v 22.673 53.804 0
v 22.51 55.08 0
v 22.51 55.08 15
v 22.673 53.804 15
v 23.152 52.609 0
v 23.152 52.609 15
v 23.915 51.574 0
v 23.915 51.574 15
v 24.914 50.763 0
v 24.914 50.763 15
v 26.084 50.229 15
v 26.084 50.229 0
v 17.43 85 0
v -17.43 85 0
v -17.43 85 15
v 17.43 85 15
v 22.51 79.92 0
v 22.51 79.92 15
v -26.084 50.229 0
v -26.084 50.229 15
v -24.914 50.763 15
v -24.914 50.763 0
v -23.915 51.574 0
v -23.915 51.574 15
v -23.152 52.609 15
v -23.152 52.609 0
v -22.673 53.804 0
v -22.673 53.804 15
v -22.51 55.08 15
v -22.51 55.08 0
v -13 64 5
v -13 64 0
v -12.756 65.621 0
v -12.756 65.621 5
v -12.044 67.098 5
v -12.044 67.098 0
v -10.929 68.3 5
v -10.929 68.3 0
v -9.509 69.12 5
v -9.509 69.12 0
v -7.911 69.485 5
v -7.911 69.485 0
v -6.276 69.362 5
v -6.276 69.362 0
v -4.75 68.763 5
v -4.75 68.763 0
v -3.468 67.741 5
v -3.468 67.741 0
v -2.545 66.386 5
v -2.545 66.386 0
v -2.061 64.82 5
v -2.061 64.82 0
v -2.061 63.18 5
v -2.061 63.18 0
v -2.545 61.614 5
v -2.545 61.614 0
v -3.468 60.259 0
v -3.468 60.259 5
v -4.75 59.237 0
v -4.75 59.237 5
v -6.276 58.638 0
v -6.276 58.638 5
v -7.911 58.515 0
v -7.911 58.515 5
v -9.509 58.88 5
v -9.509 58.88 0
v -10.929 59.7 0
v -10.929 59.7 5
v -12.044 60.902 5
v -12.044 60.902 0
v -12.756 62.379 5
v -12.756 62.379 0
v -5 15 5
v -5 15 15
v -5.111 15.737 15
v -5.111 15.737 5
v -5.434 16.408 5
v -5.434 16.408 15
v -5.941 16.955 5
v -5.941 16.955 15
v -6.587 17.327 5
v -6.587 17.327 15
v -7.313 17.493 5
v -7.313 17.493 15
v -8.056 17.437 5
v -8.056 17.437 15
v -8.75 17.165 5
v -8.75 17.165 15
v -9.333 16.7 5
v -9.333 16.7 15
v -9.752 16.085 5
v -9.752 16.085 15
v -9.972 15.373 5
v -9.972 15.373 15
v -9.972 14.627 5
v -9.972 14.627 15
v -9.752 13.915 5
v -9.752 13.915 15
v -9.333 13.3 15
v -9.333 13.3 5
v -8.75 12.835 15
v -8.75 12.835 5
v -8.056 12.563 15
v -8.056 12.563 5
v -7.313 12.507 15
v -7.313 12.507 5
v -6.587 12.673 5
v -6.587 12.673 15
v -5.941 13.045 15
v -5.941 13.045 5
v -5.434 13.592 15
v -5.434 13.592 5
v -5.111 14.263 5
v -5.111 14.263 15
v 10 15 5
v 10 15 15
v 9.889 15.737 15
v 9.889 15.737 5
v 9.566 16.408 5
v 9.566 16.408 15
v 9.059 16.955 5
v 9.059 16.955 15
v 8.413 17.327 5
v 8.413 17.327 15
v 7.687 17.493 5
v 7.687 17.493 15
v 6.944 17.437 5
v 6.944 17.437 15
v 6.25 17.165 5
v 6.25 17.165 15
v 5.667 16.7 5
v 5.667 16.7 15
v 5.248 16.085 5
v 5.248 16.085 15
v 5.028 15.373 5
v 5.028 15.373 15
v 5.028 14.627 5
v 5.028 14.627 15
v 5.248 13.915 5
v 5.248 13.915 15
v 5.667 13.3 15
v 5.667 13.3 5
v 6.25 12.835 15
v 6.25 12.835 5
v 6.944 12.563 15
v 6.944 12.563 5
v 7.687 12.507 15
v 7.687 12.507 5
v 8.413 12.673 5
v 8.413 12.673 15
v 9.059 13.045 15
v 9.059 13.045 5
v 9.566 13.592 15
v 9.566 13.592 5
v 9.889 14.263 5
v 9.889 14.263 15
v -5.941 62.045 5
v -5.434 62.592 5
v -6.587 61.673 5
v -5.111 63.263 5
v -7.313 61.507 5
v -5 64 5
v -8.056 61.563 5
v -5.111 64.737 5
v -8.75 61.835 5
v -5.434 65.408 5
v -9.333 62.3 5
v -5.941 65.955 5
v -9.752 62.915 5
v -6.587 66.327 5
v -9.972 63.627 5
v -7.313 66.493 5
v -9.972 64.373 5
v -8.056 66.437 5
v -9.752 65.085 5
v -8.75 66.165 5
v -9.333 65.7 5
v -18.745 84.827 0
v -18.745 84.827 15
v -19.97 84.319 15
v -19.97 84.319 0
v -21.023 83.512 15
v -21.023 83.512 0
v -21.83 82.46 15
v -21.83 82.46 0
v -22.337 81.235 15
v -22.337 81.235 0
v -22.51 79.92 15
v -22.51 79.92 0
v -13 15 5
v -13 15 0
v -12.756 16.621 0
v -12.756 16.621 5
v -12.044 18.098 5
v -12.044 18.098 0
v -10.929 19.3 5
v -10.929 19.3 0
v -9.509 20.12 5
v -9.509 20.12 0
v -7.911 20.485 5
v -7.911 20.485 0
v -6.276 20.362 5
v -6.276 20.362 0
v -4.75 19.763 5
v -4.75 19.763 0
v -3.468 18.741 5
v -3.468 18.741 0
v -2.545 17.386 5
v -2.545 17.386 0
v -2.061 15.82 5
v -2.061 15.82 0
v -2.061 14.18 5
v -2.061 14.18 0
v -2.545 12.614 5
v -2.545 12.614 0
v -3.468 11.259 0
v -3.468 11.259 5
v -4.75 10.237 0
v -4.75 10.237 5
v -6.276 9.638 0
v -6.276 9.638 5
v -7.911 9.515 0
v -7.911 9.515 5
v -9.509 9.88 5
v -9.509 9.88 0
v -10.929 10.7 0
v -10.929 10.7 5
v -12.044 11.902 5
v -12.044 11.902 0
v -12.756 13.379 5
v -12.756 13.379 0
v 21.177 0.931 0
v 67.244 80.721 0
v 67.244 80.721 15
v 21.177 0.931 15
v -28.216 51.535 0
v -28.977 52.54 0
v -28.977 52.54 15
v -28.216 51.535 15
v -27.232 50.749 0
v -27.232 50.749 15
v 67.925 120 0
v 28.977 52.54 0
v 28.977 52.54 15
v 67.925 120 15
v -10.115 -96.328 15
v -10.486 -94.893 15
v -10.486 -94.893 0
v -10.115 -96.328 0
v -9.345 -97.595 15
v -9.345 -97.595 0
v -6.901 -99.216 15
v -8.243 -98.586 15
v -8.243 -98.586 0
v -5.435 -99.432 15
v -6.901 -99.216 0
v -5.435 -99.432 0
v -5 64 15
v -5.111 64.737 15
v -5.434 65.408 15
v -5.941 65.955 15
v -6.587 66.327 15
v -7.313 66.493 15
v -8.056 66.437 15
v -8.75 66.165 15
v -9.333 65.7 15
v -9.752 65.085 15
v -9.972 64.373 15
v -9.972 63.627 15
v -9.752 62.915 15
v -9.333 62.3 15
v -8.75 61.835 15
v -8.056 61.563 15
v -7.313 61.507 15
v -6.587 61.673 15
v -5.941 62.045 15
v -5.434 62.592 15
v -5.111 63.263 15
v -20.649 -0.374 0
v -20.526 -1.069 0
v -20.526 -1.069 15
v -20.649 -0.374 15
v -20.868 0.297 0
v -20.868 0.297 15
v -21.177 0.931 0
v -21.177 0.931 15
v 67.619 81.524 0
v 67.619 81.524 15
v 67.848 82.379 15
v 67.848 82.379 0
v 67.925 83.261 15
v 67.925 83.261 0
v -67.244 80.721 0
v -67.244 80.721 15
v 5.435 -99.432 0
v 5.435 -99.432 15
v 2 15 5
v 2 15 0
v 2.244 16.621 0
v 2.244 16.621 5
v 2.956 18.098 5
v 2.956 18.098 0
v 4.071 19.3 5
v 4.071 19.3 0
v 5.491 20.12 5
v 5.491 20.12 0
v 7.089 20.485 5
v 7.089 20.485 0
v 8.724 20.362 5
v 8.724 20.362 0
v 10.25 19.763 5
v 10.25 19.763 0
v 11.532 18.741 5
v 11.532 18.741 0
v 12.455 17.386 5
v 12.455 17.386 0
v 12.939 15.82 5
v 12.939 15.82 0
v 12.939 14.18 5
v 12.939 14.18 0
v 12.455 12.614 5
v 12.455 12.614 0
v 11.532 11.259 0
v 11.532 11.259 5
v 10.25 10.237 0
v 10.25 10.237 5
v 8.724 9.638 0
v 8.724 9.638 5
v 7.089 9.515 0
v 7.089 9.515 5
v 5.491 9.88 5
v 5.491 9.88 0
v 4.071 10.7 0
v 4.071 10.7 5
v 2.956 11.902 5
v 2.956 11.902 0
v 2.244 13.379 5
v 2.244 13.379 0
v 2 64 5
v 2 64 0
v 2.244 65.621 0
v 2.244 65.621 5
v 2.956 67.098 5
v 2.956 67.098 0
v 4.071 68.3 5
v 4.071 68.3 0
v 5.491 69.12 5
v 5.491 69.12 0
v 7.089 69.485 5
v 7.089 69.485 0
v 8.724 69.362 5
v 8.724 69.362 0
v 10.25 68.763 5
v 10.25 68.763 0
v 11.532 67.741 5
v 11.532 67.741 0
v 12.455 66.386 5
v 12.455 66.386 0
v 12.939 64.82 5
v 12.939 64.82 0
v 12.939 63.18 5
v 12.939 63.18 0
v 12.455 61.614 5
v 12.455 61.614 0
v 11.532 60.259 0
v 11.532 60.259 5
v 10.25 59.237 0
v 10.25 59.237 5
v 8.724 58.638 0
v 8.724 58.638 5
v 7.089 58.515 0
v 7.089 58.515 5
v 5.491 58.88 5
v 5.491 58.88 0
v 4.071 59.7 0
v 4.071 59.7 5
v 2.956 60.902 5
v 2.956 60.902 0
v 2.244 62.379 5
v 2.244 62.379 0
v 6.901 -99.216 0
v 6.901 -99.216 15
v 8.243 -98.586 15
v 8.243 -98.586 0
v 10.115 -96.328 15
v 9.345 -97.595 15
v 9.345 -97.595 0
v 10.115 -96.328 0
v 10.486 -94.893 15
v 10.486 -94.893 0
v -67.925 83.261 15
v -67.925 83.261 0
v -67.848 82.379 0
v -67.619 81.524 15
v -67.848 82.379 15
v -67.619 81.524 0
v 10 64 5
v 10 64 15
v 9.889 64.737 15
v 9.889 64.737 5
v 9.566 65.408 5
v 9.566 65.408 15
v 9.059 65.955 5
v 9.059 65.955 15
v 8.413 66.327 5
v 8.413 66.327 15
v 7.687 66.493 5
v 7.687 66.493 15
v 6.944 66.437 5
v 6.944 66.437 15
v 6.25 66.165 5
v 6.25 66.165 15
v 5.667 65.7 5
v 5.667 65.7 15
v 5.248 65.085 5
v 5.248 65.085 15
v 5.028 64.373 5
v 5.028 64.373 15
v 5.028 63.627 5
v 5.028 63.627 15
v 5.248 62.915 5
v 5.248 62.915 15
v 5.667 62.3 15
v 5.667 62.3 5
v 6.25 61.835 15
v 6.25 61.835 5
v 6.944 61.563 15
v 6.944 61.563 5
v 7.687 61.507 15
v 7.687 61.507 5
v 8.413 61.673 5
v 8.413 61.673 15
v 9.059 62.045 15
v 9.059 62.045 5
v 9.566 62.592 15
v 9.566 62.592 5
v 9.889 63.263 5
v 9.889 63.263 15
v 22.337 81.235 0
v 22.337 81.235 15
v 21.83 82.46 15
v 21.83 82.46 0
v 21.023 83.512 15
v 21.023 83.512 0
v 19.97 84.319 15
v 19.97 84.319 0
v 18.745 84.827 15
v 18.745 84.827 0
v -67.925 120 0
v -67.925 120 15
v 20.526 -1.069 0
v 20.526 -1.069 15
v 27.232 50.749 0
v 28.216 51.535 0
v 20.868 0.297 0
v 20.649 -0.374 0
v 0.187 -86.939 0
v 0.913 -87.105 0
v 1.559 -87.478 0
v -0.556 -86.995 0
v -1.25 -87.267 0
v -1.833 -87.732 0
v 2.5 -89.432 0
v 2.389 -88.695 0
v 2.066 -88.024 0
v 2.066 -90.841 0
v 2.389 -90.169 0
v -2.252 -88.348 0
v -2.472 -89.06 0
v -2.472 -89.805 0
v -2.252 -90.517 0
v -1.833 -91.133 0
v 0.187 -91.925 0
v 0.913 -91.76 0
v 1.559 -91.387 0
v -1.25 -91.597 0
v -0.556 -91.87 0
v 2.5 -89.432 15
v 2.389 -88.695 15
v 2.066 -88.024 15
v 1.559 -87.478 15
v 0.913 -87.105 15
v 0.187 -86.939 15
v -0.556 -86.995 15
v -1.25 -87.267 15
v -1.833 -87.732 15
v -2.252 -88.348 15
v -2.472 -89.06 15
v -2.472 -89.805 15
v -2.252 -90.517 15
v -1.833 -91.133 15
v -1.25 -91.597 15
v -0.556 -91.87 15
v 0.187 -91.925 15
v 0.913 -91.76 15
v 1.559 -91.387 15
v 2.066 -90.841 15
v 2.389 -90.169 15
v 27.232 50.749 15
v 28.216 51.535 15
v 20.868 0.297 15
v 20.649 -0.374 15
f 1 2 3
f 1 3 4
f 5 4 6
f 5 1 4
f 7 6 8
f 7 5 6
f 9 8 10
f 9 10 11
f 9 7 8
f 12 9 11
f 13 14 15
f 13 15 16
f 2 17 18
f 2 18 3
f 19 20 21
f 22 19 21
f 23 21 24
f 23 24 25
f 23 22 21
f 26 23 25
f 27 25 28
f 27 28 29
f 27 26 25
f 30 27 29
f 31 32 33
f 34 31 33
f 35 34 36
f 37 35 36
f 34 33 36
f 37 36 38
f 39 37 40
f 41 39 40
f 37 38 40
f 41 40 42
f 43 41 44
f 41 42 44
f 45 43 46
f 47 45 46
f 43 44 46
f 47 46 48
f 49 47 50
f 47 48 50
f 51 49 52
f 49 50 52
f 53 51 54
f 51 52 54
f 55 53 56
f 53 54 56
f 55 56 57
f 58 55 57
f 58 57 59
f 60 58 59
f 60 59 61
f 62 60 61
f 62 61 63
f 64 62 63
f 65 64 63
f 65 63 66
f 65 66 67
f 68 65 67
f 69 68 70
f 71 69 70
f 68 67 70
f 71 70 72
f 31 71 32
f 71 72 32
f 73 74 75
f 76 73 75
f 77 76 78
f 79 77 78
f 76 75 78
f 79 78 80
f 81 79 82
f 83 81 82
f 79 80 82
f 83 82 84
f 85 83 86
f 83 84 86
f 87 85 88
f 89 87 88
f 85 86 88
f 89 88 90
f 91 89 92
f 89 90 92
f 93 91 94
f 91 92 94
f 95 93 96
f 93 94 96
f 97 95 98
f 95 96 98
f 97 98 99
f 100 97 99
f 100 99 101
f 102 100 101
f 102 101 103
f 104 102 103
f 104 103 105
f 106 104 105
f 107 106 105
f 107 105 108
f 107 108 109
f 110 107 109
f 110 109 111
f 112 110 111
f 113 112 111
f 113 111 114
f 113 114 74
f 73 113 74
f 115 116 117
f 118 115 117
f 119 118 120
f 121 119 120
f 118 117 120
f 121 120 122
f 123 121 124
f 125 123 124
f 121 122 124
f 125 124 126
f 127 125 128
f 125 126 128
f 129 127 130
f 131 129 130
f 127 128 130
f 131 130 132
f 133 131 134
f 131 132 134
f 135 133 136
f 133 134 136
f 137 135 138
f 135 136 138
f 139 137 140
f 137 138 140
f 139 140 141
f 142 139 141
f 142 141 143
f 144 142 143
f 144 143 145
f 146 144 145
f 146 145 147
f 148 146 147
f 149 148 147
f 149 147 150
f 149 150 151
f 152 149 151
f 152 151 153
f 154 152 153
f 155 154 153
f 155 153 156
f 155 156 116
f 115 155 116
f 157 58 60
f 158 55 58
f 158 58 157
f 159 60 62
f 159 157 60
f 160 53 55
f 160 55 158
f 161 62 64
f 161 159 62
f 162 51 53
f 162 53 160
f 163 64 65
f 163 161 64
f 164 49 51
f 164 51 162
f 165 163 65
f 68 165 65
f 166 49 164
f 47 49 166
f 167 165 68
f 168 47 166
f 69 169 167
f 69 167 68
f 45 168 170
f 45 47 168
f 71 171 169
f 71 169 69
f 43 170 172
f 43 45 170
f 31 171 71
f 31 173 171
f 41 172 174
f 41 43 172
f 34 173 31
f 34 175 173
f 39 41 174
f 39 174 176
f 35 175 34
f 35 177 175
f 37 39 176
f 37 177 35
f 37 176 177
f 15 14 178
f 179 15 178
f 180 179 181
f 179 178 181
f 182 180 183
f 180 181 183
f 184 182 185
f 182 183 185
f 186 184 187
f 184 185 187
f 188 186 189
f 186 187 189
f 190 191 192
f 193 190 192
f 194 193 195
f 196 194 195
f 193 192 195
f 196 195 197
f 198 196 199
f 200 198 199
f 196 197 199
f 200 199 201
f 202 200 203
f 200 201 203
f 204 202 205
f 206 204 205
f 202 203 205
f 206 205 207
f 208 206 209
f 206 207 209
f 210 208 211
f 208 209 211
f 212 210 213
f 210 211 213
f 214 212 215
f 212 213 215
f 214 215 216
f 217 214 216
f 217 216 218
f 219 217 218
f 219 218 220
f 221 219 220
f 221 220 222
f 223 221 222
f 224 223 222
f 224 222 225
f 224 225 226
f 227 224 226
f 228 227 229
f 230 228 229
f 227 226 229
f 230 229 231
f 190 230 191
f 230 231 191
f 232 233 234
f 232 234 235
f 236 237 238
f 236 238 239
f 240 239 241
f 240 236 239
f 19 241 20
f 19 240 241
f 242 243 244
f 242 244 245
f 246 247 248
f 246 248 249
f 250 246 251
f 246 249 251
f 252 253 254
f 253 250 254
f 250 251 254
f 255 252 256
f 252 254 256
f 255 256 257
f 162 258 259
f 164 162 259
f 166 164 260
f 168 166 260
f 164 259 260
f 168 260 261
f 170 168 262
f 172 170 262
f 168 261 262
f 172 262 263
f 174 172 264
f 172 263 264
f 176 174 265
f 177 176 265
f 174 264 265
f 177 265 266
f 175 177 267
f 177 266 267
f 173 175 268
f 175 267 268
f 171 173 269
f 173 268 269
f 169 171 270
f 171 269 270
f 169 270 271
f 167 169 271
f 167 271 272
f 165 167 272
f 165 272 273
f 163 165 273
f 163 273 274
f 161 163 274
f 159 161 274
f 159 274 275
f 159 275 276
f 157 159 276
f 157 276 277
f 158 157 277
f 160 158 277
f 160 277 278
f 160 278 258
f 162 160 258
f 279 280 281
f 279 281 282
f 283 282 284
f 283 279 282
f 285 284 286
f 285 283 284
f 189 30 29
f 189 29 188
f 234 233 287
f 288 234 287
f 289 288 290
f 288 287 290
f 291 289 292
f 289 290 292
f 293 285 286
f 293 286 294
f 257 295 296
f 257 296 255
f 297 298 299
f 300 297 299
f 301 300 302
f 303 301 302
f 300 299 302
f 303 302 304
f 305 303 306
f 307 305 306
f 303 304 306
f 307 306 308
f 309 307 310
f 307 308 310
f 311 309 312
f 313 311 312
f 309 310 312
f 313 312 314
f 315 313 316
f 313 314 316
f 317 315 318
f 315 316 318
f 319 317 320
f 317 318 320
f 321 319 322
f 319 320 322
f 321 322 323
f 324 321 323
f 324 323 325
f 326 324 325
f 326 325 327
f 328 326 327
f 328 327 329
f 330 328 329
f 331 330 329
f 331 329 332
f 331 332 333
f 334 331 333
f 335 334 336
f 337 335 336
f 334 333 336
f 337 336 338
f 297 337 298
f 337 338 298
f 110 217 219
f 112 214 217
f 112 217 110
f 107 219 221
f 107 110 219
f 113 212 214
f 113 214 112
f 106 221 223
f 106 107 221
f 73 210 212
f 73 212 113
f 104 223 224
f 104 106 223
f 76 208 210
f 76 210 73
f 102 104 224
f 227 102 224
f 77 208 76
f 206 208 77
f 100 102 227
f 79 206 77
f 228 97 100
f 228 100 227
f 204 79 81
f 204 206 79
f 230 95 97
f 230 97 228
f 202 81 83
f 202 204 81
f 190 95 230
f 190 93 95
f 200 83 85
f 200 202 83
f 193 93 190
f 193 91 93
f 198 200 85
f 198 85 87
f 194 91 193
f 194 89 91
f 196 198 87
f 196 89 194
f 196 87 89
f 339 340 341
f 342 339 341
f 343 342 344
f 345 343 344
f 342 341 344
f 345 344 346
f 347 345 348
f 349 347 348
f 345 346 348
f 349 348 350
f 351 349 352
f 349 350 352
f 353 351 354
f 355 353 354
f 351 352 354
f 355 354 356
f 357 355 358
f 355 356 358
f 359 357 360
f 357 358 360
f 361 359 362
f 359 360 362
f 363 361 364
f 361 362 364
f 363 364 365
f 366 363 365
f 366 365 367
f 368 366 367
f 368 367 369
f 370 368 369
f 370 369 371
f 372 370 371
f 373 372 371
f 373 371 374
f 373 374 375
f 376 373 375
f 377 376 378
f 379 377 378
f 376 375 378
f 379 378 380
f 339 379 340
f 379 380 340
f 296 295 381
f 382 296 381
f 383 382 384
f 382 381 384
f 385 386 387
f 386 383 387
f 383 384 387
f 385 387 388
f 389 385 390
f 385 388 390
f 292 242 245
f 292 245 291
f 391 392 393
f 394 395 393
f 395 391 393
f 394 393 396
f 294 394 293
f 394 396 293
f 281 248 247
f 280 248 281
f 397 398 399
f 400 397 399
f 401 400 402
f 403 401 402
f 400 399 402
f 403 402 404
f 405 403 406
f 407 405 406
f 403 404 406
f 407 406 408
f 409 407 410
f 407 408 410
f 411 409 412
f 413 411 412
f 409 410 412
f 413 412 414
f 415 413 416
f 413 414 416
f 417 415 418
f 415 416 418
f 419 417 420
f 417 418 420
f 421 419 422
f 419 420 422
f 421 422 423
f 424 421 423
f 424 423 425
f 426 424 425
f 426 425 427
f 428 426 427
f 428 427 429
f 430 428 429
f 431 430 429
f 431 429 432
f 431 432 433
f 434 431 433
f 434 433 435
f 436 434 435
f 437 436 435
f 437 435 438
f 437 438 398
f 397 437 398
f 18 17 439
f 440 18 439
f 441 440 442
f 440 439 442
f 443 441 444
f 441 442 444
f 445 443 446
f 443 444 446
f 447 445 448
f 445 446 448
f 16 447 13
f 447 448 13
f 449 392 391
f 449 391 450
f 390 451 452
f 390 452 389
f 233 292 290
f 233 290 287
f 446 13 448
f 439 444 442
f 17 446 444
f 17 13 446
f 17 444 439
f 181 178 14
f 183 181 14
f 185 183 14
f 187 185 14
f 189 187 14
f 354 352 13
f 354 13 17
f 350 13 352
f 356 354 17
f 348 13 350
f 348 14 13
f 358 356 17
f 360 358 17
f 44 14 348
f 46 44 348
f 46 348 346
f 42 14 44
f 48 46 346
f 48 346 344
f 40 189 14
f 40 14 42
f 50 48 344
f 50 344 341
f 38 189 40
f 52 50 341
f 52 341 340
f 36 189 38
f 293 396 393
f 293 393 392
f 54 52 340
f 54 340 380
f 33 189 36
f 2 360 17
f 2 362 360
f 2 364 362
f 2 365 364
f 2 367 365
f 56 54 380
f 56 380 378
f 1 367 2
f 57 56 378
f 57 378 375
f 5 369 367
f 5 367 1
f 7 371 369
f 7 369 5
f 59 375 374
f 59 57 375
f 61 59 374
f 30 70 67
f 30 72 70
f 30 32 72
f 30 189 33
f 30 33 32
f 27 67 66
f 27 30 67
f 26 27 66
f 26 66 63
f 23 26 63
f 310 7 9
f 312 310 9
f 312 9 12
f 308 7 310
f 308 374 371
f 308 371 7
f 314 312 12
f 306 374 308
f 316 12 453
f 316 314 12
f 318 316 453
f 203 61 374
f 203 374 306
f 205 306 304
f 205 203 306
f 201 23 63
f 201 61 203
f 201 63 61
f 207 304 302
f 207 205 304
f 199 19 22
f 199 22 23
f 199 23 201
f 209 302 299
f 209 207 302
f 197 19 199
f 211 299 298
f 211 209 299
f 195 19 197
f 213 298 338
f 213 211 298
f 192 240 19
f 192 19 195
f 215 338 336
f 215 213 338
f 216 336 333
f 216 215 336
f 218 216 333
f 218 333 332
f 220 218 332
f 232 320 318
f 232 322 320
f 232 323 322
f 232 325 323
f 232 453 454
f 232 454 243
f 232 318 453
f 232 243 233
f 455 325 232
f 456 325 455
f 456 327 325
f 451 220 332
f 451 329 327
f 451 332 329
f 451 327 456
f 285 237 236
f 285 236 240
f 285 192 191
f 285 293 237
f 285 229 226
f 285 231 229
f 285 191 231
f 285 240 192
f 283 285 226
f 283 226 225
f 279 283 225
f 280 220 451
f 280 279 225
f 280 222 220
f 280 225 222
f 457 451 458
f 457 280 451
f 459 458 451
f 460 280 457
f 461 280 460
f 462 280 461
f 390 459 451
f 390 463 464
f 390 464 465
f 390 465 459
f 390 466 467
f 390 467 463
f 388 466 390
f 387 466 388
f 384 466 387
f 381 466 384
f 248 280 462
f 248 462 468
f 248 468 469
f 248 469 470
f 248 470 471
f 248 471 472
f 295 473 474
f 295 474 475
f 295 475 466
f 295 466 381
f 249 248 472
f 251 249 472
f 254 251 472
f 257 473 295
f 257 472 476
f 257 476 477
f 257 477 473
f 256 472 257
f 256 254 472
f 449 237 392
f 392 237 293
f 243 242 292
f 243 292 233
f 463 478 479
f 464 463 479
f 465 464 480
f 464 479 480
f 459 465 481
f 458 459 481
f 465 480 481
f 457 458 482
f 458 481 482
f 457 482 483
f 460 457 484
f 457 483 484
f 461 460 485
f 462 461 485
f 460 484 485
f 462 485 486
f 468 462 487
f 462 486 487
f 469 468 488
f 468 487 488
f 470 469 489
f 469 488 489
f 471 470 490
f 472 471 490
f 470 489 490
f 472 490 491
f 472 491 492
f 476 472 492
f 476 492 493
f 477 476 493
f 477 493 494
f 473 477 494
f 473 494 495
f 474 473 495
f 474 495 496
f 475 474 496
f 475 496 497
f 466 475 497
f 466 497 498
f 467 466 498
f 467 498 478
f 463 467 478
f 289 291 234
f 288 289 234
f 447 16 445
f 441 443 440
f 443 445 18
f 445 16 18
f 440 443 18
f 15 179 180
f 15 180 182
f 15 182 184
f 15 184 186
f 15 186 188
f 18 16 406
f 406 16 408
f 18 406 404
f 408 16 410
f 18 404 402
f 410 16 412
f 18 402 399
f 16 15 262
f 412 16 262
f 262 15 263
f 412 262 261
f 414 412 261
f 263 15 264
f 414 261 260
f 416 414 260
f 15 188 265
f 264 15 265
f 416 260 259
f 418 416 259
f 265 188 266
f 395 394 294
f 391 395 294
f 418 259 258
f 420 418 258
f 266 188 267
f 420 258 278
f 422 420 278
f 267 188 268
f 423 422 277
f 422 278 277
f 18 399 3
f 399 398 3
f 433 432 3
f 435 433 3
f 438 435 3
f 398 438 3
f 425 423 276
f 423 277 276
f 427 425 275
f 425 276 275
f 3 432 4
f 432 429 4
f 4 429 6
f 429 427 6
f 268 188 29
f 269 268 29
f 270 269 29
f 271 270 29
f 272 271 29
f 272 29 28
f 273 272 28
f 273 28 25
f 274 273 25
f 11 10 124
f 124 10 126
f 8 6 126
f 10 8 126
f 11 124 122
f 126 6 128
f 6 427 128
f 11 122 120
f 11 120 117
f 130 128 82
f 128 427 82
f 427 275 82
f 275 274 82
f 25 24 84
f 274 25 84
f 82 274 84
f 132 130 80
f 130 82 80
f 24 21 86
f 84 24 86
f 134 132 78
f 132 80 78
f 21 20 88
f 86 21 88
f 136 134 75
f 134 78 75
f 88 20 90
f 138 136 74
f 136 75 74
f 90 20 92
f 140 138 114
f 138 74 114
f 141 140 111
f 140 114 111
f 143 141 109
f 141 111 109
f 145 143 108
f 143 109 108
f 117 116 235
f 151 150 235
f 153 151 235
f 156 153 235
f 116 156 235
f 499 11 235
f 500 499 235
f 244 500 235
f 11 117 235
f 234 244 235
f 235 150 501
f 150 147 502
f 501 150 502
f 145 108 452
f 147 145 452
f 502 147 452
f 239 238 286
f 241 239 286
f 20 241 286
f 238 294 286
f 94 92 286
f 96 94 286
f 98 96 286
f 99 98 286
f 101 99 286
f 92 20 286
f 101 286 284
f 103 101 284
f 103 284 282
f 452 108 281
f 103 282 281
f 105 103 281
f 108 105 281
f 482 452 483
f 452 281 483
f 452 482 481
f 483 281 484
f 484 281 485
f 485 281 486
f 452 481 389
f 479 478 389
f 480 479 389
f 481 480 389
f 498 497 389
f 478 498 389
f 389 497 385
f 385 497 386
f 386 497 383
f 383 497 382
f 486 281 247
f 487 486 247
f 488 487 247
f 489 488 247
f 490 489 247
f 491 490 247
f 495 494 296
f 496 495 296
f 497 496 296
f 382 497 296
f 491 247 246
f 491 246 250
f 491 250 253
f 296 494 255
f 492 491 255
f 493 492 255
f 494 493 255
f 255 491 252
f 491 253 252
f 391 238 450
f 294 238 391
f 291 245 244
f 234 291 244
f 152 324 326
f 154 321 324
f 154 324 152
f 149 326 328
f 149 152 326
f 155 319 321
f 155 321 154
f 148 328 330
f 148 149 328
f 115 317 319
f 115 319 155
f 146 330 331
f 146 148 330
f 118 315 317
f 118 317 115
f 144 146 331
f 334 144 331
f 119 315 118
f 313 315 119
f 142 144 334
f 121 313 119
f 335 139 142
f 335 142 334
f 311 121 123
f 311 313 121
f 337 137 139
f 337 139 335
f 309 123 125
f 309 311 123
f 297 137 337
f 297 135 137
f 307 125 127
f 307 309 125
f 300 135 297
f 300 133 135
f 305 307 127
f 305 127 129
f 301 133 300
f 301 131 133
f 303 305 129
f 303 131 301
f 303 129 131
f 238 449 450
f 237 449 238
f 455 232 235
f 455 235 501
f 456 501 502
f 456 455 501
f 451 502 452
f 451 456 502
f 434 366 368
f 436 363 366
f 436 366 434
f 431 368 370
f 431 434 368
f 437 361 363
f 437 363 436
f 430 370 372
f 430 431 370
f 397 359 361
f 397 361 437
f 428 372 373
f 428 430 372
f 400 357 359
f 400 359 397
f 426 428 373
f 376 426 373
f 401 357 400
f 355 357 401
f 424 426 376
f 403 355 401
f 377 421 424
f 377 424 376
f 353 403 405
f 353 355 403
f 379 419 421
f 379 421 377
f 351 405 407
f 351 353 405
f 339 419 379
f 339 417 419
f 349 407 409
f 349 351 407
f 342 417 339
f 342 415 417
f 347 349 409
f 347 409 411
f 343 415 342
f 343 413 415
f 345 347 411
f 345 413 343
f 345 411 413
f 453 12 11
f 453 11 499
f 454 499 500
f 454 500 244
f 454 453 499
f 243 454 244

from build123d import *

# Parameters (mm, degrees)
BOSS_EXTRUDE1_DEPTH   = 15
FILLET1_R             = 5.08
F_5_0MM_DOWEL_HOLE1_D = 5
SKETCH16_R            = 5.5
CUT_EXTRUDE2_DEPTH    = 5
SKETCH14_R            = 2.5
CUT_EXTRUDE1_DEPTH    = 139.704015318
LPATTERN2_COUNT       = 2
LPATTERN2_PITCH       = 49


with BuildPart() as part:
    # Sketch1 → Boss-Extrude1 (new body)
    with BuildSketch(Plane.XY):
        Polygon((27.510468203, 50), (67.924987047, 120), (67.924987047, 81.9), (20.64, 0), (10, -99.432340815), (-10, -99.432340815), (-20.64, 0), (-67.924987047, 81.9), (-67.924987047, 120), (-27.510468203, 50), (-22.510468203, 50), (-22.510468203, 85), (22.510468203, 85), (22.510468203, 50), align=None)
    extrude(amount=BOSS_EXTRUDE1_DEPTH)

    # Fillet1
    # the kernel refuses this fillet: 5.08 mm, written as the material it adds along each edge
    with BuildSketch(Plane(origin=(20.64, 0, 0), x_dir=(0.5000000000000017, 0.8660254037844377, 0), z_dir=(0, 0, 1)), Plane(origin=(-20.64, 0, 0), x_dir=(0.10639999999998911, -0.9943234081524995, 0), z_dir=(0, 0, 1))) as fillet1_piece_1:
        with BuildLine():
            CenterArc((FILLET1_R * 0.211573226201, -FILLET1_R), FILLET1_R, 90, 23.892167456)
            Line((-FILLET1_R * 0.193443374913, -FILLET1_R * 0.0856906689624), (0, 0))
            Line((0, 0), (FILLET1_R * 0.211573226201, 0))
        make_face()
    extrude(amount=15)
    with BuildSketch(Plane(origin=(27.510468203, 50, 0), x_dir=(0.4999999999999992, 0.8660254037844392, 0), z_dir=(0, 0, 1))) as fillet1_piece_2:
        with BuildLine():
            CenterArc((FILLET1_R * 0.57735026919, FILLET1_R), FILLET1_R, 210, 60)
            Line((-FILLET1_R * 0.288675134595, FILLET1_R * 0.5), (0, 0))
            Line((0, 0), (FILLET1_R * 0.57735026919, 0))
        make_face()
    extrude(amount=15)
    with BuildSketch(Plane(origin=(22.510468203, 50, 0), x_dir=(0, 1, 0), z_dir=(0, 0, 1)), Plane(origin=(-22.510468203, 50, 0), x_dir=(-1, 0, 0), z_dir=(0, 0, 1))) as fillet1_piece_3:
        with BuildLine():
            CenterArc((FILLET1_R, -FILLET1_R), FILLET1_R, 90, 90)
            Line((0, -FILLET1_R), (0, 0))
            Line((0, 0), (FILLET1_R, 0))
        make_face()
    extrude(amount=15)
    with BuildSketch(Plane(origin=(-27.510468203, 50, 0), x_dir=(-0.5000000000000053, 0.8660254037844356, 0), z_dir=(0, 0, 1))) as fillet1_piece_4:
        with BuildLine():
            CenterArc((FILLET1_R * 0.57735026919, -FILLET1_R), FILLET1_R, 90, 60)
            Line((-FILLET1_R * 0.288675134595, -FILLET1_R * 0.5), (0, 0))
            Line((0, 0), (FILLET1_R * 0.57735026919, 0))
        make_face()
    extrude(amount=15)
    # the kernel refuses this fillet: 5.08 mm, written as the material it takes off along each edge
    with BuildSketch(Plane(origin=(-10, -99.432340815, -11.413509837), x_dir=(-0.10639999999999113, 0.9943234081524995, 0), z_dir=(0, 0, 1)), Plane(origin=(10, -99.432340815, -11.413509837), x_dir=(-1, 0, 0), z_dir=(0, 0, 1))) as fillet1_2_piece_1:
        with BuildLine():
            CenterArc((FILLET1_R * 0.89870156196, -FILLET1_R), FILLET1_R, 90, 83.892167456)
            Line((-FILLET1_R * 0.0956218461925, -FILLET1_R * 0.8936), (0, 0))
            Line((0, 0), (FILLET1_R * 0.89870156196, 0))
        make_face()
    extrude(amount=37.827019674, mode=Mode.SUBTRACT)
    with BuildSketch(Plane(origin=(67.924987047, 81.9, -3.402954744), x_dir=(-0.4999999999999986, -0.8660254037844396, 0), z_dir=(0, 0, 1)), Plane(origin=(-67.924987047, 81.9, -3.402954744), x_dir=(0, 1, 0), z_dir=(0, 0, 1))) as fillet1_2_piece_2:
        with BuildLine():
            CenterArc((FILLET1_R * 0.267949192431, -FILLET1_R), FILLET1_R, 90, 30)
            Line((-FILLET1_R * 0.232050807569, -FILLET1_R * 0.133974596216), (0, 0))
            Line((0, 0), (FILLET1_R * 0.267949192431, 0))
        make_face()
    extrude(amount=21.805909488, mode=Mode.SUBTRACT)
    with BuildSketch(Plane(origin=(-22.510468203, 85, -12.7), x_dir=(1, 0, 0), z_dir=(0, 0, 1)), Plane(origin=(22.510468203, 85, -12.7), x_dir=(0, -1, 0), z_dir=(0, 0, 1))) as fillet1_2_piece_3:
        with BuildLine():
            CenterArc((FILLET1_R, -FILLET1_R), FILLET1_R, 90, 90)
            Line((0, -FILLET1_R), (0, 0))
            Line((0, 0), (FILLET1_R, 0))
        make_face()
    extrude(amount=40.4, mode=Mode.SUBTRACT)

    # Ø5.0mm Dowel Hole1 (through all)
    with Locations(Plane(origin=(0, 0, 0), x_dir=(-1, 0, 0), z_dir=(0, 0, -1))):
        with Locations((7.5, 15), (-7.5, 15)):
            f_5_0mm_dowel_hole1 = Hole(F_5_0MM_DOWEL_HOLE1_D / 2)

    # Sketch16 → Cut-Extrude2 (cut)
    with BuildSketch(Plane(origin=(0, 0, 0), x_dir=(-1, 0, 0), z_dir=(0, 0, -1))):
        with Locations((-7.5, 15)):
            Circle(SKETCH16_R)
        with Locations((7.5, 15)):
            Circle(SKETCH16_R)
    cut_extrude2 = extrude(amount=-CUT_EXTRUDE2_DEPTH, mode=Mode.SUBTRACT)

    # Sketch14 → Cut-Extrude1 (cut, through all)
    with BuildSketch(Plane.XY.offset(15)):
        with Locations((0, -89.432340815)):
            Circle(SKETCH14_R)
    extrude(amount=-CUT_EXTRUDE1_DEPTH, mode=Mode.SUBTRACT)

    # LPattern2: Ø5.0mm Dowel Hole1, Cut-Extrude2 ×2
    with Locations(*[(0, i * LPATTERN2_PITCH, 0) for i in range(1, LPATTERN2_COUNT)]):
        add(f_5_0mm_dowel_hole1, mode=Mode.SUBTRACT)
        add(cut_extrude2, mode=Mode.SUBTRACT)


solid = part.part
